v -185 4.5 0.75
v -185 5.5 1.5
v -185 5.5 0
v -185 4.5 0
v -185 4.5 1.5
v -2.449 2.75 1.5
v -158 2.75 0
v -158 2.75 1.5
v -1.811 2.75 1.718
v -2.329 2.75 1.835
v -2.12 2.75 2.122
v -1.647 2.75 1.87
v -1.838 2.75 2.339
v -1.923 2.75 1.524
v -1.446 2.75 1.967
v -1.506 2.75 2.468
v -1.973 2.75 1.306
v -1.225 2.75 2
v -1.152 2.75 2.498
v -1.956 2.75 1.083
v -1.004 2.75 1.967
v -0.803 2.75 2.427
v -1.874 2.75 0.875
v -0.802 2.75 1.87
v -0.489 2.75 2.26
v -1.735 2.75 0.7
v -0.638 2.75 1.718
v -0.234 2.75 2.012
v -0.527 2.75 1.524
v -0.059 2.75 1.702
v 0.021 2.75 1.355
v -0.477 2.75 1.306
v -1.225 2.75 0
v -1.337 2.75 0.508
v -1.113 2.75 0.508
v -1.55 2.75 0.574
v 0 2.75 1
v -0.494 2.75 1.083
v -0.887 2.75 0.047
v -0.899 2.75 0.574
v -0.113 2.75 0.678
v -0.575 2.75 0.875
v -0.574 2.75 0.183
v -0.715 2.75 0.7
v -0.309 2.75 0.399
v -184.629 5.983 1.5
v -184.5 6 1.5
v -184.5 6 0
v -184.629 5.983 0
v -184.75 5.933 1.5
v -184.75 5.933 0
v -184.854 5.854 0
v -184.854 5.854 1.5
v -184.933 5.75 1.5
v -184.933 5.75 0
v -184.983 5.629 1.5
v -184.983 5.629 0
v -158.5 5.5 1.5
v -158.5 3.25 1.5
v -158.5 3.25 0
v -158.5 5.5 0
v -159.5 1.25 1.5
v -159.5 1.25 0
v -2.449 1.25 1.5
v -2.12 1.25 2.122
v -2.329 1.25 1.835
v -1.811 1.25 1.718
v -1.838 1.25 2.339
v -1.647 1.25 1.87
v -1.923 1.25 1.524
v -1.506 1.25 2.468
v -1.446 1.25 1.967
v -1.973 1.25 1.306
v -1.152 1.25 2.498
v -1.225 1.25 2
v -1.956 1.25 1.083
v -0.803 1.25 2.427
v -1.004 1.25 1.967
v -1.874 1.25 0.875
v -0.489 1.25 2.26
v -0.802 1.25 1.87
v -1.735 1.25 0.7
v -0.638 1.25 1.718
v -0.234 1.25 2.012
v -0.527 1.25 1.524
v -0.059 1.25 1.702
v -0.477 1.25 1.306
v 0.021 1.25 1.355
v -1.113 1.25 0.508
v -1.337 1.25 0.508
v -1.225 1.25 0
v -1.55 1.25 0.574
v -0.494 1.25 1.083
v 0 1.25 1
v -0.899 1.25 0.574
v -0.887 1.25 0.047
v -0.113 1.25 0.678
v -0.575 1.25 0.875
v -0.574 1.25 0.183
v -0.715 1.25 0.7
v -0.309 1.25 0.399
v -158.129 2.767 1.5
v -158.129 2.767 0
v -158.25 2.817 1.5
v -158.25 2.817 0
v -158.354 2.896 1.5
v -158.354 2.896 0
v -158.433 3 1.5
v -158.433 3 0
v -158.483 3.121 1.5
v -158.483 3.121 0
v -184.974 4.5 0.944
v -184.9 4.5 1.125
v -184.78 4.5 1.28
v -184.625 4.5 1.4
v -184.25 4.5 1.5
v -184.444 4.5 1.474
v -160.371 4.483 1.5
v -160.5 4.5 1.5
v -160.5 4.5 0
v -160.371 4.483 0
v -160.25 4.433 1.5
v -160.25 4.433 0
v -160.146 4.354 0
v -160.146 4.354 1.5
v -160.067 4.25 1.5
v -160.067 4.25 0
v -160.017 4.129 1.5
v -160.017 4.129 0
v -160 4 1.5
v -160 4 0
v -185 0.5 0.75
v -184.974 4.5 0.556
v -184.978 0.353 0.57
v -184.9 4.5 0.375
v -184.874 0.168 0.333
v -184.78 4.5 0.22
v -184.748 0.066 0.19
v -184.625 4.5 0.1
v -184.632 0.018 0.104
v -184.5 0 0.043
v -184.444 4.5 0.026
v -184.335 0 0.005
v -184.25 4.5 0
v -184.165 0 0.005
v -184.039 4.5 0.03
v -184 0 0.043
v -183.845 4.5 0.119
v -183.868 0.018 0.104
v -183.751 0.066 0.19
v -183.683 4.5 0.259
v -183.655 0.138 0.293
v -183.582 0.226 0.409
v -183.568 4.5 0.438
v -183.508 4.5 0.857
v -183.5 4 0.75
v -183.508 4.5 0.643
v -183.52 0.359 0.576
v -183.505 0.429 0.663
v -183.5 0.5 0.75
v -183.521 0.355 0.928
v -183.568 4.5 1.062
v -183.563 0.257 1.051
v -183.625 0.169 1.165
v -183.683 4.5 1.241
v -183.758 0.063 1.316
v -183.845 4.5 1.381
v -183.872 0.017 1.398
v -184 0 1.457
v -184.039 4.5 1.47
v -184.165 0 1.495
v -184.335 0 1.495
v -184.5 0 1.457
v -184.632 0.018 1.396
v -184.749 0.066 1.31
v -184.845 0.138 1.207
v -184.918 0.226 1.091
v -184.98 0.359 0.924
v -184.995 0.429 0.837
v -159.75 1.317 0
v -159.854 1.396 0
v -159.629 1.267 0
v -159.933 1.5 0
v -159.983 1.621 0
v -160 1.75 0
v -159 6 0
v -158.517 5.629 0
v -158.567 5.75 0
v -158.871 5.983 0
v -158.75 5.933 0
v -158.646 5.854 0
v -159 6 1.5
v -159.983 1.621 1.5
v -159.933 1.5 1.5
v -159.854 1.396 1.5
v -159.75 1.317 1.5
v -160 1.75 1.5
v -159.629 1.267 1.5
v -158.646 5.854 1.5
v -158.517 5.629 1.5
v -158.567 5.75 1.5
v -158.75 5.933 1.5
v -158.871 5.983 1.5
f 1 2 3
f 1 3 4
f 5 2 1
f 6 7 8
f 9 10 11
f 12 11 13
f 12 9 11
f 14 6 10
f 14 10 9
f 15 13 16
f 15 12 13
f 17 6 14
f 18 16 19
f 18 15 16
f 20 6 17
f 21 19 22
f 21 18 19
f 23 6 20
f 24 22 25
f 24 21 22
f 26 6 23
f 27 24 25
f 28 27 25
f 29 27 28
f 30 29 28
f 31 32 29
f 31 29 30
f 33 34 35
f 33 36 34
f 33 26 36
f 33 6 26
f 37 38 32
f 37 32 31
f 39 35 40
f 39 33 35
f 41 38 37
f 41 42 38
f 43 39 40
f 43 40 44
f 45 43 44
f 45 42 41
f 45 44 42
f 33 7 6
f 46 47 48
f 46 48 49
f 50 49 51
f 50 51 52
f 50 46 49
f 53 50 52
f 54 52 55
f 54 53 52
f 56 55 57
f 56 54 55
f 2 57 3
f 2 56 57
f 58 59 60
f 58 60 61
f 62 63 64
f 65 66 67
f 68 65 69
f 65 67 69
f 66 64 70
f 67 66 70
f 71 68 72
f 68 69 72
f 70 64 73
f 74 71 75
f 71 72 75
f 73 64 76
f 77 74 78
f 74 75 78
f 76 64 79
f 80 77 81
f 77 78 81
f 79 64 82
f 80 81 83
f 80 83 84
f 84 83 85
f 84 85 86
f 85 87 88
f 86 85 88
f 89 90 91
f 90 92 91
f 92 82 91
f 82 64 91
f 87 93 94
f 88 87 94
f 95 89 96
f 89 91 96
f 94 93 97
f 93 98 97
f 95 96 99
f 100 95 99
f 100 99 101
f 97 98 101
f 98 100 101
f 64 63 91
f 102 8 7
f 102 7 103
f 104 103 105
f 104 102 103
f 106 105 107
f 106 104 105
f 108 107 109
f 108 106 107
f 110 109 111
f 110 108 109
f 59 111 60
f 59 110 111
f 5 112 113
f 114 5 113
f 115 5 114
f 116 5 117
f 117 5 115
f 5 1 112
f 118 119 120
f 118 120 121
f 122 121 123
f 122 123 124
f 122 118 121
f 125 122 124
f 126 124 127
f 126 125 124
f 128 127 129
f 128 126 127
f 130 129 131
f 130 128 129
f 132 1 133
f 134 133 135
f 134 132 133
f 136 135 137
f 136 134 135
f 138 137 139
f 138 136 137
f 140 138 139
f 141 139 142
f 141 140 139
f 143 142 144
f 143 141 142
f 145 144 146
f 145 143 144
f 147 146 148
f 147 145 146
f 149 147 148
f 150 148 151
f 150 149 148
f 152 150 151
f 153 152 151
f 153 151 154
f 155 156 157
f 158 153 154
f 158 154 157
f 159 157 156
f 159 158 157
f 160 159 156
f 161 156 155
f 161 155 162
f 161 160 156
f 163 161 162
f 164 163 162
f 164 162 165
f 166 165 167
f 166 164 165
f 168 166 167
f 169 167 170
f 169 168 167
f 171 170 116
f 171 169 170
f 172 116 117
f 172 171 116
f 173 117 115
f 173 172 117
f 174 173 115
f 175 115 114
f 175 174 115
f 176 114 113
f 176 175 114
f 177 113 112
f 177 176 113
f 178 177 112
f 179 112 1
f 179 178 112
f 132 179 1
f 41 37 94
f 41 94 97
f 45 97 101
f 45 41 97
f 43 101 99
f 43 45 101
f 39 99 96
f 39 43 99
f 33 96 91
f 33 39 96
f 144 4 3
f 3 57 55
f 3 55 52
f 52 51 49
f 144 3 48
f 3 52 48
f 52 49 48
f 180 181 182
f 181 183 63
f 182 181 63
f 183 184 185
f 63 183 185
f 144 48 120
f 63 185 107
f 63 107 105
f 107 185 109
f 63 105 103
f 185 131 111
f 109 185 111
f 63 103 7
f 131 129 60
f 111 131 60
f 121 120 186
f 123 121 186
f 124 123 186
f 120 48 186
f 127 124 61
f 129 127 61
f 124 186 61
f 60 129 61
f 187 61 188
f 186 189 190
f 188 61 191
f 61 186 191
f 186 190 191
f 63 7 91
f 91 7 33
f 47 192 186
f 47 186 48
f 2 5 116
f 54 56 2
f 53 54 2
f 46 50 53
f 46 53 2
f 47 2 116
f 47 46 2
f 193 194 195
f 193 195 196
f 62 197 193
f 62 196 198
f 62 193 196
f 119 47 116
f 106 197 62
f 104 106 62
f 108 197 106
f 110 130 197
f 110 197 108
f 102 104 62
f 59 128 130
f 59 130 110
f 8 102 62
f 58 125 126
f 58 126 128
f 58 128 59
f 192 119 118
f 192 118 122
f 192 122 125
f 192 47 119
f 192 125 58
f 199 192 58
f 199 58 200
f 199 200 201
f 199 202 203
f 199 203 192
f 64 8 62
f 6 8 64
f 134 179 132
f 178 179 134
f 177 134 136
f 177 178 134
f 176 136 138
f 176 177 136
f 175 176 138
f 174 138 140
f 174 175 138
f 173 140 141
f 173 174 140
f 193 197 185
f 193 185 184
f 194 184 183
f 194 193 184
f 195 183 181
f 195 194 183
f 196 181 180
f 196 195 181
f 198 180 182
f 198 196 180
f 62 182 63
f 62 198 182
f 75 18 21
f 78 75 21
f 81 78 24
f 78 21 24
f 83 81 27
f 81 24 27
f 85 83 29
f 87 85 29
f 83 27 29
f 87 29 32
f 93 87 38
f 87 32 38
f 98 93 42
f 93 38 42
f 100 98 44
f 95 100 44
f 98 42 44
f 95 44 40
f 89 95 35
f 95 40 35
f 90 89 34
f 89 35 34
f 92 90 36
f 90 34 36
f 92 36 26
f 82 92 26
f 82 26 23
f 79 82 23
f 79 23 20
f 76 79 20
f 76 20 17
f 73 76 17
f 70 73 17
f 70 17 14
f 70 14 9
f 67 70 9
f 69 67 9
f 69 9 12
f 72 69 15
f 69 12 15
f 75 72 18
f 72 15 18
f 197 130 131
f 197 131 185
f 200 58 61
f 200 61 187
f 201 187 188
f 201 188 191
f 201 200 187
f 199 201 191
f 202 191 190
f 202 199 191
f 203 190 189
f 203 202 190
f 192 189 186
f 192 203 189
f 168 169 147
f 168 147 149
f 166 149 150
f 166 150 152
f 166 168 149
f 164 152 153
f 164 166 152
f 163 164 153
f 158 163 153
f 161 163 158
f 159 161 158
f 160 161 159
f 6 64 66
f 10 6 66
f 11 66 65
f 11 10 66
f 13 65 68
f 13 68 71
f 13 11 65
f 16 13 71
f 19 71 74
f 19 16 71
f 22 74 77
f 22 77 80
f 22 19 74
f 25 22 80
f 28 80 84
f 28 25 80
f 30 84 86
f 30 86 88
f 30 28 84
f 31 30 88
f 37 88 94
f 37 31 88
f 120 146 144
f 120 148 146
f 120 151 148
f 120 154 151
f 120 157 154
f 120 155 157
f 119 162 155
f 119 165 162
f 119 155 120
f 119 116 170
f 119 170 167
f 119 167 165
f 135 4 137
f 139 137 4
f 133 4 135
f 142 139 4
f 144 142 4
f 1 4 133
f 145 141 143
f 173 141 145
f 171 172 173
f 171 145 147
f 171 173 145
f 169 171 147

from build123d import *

# Parameters (mm, degrees)
SCHIZZO1_W                   = 185
SCHIZZO1_H                   = 6
ESTRUSIONE_ESTRUSIONE1_DEPTH = 1.5
SCHIZZO2_OUTSIDE_W           = 224.02
SCHIZZO2_OUTSIDE_H           = 45.02
TAGLIO_ESTRUSIONE1_DEPTH     = 1.5
SCHIZZO5_W                   = 2.294465176
SCHIZZO5_H                   = 1.827727815
SCHIZZO5_R                   = 0.75
TAGLIO_ESTRUSIONE3_DEPTH     = 4.5
SCHIZZO6_R                   = 1.25
ESTRUSIONE_ESTRUSIONE3_DEPTH = 1.5
SCHIZZO7_R                   = 0.75
TAGLIO_ESTRUSIONE4_DEPTH     = 1.5


with BuildPart() as part:
    # Schizzo1 → Estrusione-Estrusione1 (new body)
    with BuildSketch(Plane.XY):
        with Locations((-92.5, 3)):
            Rectangle(SCHIZZO1_W, SCHIZZO1_H)
    extrude(amount=ESTRUSIONE_ESTRUSIONE1_DEPTH)

    # Schizzo2 outside → Taglio-Estrusione1 (cut)
    with BuildSketch(Plane.XY.offset(1.5)):
        with Locations((-92.5, 3)):
            Rectangle(SCHIZZO2_OUTSIDE_W, SCHIZZO2_OUTSIDE_H)
        with BuildLine():
            Line((-184.5, 0), (-184, 0))
            ThreePointArc((-184, 0), (-183.646446609, 0.146446609), (-183.5, 0.5))
            Line((-183.5, 0.5), (-183.5, 4))
            ThreePointArc((-183.5, 4), (-183.353553391, 4.353553391), (-183, 4.5))
            Line((-183, 4.5), (-160.5, 4.5))
            ThreePointArc((-160.5, 4.5), (-160.146446609, 4.353553391), (-160, 4))
            Line((-160, 4), (-160, 1.75))
            ThreePointArc((-160, 1.75), (-159.853553391, 1.396446609), (-159.5, 1.25))
            Line((-159.5, 1.25), (0, 1.25))
            Line((0, 1.25), (0, 2.75))
            Line((0, 2.75), (-158, 2.75))
            ThreePointArc((-158, 2.75), (-158.353553391, 2.896446609), (-158.5, 3.25))
            Line((-158.5, 3.25), (-158.5, 5.5))
            ThreePointArc((-158.5, 5.5), (-158.646446609, 5.853553391), (-159, 6))
            Line((-159, 6), (-184.5, 6))
            ThreePointArc((-184.5, 6), (-184.853553391, 5.853553391), (-185, 5.5))
            Line((-185, 5.5), (-185, 0.5))
            ThreePointArc((-185, 0.5), (-184.853553391, 0.146446609), (-184.5, 0))
        make_face(mode=Mode.SUBTRACT)
    extrude(amount=-TAGLIO_ESTRUSIONE1_DEPTH, mode=Mode.SUBTRACT)

    # Schizzo5 → Taglio-Estrusione3 (cut)
    with BuildSketch(Plane.XZ):
        with Locations((-184.019602527, 0.694189627)):
            Rectangle(SCHIZZO5_W, SCHIZZO5_H)
        with Locations(Location((-184.25, 0.75, 0), (0, 0, 180))):
            Circle(SCHIZZO5_R, mode=Mode.SUBTRACT)
    extrude(amount=-TAGLIO_ESTRUSIONE3_DEPTH, mode=Mode.SUBTRACT)

    # Schizzo6 → Estrusione-Estrusione3 (add)
    with BuildSketch(Plane(origin=(0, 2.75, 0), x_dir=(1, 0, 0), z_dir=(0, 1, 0))):
        with Locations((-1.224744871, -1.25)):
            Circle(SCHIZZO6_R)
    extrude(amount=-ESTRUSIONE_ESTRUSIONE3_DEPTH)

    # Schizzo7 → Taglio-Estrusione4 (cut)
    with BuildSketch(Plane(origin=(0, 2.75, 0), x_dir=(1, 0, 0), z_dir=(0, 1, 0))):
        with Locations(Location((-1.224744871, -1.25, 0), (0, 0, 270))):
            Circle(SCHIZZO7_R)
        with BuildLine():
            Line((-1.224744871, 0), (-1.224744871, 0.534346319))
            Line((-1.224744871, 0.534346319), (0.72573961, 0.534346319))
            Line((0.72573961, 0.534346319), (0.72573961, -1.25))
            Line((0.72573961, -1.25), (0.025255129, -1.25))
            ThreePointArc((0.025255129, -1.25), (-0.340861395, -0.366116524), (-1.224744871, 0))
        make_face()
    extrude(amount=-TAGLIO_ESTRUSIONE4_DEPTH, mode=Mode.SUBTRACT)


solid = part.part
